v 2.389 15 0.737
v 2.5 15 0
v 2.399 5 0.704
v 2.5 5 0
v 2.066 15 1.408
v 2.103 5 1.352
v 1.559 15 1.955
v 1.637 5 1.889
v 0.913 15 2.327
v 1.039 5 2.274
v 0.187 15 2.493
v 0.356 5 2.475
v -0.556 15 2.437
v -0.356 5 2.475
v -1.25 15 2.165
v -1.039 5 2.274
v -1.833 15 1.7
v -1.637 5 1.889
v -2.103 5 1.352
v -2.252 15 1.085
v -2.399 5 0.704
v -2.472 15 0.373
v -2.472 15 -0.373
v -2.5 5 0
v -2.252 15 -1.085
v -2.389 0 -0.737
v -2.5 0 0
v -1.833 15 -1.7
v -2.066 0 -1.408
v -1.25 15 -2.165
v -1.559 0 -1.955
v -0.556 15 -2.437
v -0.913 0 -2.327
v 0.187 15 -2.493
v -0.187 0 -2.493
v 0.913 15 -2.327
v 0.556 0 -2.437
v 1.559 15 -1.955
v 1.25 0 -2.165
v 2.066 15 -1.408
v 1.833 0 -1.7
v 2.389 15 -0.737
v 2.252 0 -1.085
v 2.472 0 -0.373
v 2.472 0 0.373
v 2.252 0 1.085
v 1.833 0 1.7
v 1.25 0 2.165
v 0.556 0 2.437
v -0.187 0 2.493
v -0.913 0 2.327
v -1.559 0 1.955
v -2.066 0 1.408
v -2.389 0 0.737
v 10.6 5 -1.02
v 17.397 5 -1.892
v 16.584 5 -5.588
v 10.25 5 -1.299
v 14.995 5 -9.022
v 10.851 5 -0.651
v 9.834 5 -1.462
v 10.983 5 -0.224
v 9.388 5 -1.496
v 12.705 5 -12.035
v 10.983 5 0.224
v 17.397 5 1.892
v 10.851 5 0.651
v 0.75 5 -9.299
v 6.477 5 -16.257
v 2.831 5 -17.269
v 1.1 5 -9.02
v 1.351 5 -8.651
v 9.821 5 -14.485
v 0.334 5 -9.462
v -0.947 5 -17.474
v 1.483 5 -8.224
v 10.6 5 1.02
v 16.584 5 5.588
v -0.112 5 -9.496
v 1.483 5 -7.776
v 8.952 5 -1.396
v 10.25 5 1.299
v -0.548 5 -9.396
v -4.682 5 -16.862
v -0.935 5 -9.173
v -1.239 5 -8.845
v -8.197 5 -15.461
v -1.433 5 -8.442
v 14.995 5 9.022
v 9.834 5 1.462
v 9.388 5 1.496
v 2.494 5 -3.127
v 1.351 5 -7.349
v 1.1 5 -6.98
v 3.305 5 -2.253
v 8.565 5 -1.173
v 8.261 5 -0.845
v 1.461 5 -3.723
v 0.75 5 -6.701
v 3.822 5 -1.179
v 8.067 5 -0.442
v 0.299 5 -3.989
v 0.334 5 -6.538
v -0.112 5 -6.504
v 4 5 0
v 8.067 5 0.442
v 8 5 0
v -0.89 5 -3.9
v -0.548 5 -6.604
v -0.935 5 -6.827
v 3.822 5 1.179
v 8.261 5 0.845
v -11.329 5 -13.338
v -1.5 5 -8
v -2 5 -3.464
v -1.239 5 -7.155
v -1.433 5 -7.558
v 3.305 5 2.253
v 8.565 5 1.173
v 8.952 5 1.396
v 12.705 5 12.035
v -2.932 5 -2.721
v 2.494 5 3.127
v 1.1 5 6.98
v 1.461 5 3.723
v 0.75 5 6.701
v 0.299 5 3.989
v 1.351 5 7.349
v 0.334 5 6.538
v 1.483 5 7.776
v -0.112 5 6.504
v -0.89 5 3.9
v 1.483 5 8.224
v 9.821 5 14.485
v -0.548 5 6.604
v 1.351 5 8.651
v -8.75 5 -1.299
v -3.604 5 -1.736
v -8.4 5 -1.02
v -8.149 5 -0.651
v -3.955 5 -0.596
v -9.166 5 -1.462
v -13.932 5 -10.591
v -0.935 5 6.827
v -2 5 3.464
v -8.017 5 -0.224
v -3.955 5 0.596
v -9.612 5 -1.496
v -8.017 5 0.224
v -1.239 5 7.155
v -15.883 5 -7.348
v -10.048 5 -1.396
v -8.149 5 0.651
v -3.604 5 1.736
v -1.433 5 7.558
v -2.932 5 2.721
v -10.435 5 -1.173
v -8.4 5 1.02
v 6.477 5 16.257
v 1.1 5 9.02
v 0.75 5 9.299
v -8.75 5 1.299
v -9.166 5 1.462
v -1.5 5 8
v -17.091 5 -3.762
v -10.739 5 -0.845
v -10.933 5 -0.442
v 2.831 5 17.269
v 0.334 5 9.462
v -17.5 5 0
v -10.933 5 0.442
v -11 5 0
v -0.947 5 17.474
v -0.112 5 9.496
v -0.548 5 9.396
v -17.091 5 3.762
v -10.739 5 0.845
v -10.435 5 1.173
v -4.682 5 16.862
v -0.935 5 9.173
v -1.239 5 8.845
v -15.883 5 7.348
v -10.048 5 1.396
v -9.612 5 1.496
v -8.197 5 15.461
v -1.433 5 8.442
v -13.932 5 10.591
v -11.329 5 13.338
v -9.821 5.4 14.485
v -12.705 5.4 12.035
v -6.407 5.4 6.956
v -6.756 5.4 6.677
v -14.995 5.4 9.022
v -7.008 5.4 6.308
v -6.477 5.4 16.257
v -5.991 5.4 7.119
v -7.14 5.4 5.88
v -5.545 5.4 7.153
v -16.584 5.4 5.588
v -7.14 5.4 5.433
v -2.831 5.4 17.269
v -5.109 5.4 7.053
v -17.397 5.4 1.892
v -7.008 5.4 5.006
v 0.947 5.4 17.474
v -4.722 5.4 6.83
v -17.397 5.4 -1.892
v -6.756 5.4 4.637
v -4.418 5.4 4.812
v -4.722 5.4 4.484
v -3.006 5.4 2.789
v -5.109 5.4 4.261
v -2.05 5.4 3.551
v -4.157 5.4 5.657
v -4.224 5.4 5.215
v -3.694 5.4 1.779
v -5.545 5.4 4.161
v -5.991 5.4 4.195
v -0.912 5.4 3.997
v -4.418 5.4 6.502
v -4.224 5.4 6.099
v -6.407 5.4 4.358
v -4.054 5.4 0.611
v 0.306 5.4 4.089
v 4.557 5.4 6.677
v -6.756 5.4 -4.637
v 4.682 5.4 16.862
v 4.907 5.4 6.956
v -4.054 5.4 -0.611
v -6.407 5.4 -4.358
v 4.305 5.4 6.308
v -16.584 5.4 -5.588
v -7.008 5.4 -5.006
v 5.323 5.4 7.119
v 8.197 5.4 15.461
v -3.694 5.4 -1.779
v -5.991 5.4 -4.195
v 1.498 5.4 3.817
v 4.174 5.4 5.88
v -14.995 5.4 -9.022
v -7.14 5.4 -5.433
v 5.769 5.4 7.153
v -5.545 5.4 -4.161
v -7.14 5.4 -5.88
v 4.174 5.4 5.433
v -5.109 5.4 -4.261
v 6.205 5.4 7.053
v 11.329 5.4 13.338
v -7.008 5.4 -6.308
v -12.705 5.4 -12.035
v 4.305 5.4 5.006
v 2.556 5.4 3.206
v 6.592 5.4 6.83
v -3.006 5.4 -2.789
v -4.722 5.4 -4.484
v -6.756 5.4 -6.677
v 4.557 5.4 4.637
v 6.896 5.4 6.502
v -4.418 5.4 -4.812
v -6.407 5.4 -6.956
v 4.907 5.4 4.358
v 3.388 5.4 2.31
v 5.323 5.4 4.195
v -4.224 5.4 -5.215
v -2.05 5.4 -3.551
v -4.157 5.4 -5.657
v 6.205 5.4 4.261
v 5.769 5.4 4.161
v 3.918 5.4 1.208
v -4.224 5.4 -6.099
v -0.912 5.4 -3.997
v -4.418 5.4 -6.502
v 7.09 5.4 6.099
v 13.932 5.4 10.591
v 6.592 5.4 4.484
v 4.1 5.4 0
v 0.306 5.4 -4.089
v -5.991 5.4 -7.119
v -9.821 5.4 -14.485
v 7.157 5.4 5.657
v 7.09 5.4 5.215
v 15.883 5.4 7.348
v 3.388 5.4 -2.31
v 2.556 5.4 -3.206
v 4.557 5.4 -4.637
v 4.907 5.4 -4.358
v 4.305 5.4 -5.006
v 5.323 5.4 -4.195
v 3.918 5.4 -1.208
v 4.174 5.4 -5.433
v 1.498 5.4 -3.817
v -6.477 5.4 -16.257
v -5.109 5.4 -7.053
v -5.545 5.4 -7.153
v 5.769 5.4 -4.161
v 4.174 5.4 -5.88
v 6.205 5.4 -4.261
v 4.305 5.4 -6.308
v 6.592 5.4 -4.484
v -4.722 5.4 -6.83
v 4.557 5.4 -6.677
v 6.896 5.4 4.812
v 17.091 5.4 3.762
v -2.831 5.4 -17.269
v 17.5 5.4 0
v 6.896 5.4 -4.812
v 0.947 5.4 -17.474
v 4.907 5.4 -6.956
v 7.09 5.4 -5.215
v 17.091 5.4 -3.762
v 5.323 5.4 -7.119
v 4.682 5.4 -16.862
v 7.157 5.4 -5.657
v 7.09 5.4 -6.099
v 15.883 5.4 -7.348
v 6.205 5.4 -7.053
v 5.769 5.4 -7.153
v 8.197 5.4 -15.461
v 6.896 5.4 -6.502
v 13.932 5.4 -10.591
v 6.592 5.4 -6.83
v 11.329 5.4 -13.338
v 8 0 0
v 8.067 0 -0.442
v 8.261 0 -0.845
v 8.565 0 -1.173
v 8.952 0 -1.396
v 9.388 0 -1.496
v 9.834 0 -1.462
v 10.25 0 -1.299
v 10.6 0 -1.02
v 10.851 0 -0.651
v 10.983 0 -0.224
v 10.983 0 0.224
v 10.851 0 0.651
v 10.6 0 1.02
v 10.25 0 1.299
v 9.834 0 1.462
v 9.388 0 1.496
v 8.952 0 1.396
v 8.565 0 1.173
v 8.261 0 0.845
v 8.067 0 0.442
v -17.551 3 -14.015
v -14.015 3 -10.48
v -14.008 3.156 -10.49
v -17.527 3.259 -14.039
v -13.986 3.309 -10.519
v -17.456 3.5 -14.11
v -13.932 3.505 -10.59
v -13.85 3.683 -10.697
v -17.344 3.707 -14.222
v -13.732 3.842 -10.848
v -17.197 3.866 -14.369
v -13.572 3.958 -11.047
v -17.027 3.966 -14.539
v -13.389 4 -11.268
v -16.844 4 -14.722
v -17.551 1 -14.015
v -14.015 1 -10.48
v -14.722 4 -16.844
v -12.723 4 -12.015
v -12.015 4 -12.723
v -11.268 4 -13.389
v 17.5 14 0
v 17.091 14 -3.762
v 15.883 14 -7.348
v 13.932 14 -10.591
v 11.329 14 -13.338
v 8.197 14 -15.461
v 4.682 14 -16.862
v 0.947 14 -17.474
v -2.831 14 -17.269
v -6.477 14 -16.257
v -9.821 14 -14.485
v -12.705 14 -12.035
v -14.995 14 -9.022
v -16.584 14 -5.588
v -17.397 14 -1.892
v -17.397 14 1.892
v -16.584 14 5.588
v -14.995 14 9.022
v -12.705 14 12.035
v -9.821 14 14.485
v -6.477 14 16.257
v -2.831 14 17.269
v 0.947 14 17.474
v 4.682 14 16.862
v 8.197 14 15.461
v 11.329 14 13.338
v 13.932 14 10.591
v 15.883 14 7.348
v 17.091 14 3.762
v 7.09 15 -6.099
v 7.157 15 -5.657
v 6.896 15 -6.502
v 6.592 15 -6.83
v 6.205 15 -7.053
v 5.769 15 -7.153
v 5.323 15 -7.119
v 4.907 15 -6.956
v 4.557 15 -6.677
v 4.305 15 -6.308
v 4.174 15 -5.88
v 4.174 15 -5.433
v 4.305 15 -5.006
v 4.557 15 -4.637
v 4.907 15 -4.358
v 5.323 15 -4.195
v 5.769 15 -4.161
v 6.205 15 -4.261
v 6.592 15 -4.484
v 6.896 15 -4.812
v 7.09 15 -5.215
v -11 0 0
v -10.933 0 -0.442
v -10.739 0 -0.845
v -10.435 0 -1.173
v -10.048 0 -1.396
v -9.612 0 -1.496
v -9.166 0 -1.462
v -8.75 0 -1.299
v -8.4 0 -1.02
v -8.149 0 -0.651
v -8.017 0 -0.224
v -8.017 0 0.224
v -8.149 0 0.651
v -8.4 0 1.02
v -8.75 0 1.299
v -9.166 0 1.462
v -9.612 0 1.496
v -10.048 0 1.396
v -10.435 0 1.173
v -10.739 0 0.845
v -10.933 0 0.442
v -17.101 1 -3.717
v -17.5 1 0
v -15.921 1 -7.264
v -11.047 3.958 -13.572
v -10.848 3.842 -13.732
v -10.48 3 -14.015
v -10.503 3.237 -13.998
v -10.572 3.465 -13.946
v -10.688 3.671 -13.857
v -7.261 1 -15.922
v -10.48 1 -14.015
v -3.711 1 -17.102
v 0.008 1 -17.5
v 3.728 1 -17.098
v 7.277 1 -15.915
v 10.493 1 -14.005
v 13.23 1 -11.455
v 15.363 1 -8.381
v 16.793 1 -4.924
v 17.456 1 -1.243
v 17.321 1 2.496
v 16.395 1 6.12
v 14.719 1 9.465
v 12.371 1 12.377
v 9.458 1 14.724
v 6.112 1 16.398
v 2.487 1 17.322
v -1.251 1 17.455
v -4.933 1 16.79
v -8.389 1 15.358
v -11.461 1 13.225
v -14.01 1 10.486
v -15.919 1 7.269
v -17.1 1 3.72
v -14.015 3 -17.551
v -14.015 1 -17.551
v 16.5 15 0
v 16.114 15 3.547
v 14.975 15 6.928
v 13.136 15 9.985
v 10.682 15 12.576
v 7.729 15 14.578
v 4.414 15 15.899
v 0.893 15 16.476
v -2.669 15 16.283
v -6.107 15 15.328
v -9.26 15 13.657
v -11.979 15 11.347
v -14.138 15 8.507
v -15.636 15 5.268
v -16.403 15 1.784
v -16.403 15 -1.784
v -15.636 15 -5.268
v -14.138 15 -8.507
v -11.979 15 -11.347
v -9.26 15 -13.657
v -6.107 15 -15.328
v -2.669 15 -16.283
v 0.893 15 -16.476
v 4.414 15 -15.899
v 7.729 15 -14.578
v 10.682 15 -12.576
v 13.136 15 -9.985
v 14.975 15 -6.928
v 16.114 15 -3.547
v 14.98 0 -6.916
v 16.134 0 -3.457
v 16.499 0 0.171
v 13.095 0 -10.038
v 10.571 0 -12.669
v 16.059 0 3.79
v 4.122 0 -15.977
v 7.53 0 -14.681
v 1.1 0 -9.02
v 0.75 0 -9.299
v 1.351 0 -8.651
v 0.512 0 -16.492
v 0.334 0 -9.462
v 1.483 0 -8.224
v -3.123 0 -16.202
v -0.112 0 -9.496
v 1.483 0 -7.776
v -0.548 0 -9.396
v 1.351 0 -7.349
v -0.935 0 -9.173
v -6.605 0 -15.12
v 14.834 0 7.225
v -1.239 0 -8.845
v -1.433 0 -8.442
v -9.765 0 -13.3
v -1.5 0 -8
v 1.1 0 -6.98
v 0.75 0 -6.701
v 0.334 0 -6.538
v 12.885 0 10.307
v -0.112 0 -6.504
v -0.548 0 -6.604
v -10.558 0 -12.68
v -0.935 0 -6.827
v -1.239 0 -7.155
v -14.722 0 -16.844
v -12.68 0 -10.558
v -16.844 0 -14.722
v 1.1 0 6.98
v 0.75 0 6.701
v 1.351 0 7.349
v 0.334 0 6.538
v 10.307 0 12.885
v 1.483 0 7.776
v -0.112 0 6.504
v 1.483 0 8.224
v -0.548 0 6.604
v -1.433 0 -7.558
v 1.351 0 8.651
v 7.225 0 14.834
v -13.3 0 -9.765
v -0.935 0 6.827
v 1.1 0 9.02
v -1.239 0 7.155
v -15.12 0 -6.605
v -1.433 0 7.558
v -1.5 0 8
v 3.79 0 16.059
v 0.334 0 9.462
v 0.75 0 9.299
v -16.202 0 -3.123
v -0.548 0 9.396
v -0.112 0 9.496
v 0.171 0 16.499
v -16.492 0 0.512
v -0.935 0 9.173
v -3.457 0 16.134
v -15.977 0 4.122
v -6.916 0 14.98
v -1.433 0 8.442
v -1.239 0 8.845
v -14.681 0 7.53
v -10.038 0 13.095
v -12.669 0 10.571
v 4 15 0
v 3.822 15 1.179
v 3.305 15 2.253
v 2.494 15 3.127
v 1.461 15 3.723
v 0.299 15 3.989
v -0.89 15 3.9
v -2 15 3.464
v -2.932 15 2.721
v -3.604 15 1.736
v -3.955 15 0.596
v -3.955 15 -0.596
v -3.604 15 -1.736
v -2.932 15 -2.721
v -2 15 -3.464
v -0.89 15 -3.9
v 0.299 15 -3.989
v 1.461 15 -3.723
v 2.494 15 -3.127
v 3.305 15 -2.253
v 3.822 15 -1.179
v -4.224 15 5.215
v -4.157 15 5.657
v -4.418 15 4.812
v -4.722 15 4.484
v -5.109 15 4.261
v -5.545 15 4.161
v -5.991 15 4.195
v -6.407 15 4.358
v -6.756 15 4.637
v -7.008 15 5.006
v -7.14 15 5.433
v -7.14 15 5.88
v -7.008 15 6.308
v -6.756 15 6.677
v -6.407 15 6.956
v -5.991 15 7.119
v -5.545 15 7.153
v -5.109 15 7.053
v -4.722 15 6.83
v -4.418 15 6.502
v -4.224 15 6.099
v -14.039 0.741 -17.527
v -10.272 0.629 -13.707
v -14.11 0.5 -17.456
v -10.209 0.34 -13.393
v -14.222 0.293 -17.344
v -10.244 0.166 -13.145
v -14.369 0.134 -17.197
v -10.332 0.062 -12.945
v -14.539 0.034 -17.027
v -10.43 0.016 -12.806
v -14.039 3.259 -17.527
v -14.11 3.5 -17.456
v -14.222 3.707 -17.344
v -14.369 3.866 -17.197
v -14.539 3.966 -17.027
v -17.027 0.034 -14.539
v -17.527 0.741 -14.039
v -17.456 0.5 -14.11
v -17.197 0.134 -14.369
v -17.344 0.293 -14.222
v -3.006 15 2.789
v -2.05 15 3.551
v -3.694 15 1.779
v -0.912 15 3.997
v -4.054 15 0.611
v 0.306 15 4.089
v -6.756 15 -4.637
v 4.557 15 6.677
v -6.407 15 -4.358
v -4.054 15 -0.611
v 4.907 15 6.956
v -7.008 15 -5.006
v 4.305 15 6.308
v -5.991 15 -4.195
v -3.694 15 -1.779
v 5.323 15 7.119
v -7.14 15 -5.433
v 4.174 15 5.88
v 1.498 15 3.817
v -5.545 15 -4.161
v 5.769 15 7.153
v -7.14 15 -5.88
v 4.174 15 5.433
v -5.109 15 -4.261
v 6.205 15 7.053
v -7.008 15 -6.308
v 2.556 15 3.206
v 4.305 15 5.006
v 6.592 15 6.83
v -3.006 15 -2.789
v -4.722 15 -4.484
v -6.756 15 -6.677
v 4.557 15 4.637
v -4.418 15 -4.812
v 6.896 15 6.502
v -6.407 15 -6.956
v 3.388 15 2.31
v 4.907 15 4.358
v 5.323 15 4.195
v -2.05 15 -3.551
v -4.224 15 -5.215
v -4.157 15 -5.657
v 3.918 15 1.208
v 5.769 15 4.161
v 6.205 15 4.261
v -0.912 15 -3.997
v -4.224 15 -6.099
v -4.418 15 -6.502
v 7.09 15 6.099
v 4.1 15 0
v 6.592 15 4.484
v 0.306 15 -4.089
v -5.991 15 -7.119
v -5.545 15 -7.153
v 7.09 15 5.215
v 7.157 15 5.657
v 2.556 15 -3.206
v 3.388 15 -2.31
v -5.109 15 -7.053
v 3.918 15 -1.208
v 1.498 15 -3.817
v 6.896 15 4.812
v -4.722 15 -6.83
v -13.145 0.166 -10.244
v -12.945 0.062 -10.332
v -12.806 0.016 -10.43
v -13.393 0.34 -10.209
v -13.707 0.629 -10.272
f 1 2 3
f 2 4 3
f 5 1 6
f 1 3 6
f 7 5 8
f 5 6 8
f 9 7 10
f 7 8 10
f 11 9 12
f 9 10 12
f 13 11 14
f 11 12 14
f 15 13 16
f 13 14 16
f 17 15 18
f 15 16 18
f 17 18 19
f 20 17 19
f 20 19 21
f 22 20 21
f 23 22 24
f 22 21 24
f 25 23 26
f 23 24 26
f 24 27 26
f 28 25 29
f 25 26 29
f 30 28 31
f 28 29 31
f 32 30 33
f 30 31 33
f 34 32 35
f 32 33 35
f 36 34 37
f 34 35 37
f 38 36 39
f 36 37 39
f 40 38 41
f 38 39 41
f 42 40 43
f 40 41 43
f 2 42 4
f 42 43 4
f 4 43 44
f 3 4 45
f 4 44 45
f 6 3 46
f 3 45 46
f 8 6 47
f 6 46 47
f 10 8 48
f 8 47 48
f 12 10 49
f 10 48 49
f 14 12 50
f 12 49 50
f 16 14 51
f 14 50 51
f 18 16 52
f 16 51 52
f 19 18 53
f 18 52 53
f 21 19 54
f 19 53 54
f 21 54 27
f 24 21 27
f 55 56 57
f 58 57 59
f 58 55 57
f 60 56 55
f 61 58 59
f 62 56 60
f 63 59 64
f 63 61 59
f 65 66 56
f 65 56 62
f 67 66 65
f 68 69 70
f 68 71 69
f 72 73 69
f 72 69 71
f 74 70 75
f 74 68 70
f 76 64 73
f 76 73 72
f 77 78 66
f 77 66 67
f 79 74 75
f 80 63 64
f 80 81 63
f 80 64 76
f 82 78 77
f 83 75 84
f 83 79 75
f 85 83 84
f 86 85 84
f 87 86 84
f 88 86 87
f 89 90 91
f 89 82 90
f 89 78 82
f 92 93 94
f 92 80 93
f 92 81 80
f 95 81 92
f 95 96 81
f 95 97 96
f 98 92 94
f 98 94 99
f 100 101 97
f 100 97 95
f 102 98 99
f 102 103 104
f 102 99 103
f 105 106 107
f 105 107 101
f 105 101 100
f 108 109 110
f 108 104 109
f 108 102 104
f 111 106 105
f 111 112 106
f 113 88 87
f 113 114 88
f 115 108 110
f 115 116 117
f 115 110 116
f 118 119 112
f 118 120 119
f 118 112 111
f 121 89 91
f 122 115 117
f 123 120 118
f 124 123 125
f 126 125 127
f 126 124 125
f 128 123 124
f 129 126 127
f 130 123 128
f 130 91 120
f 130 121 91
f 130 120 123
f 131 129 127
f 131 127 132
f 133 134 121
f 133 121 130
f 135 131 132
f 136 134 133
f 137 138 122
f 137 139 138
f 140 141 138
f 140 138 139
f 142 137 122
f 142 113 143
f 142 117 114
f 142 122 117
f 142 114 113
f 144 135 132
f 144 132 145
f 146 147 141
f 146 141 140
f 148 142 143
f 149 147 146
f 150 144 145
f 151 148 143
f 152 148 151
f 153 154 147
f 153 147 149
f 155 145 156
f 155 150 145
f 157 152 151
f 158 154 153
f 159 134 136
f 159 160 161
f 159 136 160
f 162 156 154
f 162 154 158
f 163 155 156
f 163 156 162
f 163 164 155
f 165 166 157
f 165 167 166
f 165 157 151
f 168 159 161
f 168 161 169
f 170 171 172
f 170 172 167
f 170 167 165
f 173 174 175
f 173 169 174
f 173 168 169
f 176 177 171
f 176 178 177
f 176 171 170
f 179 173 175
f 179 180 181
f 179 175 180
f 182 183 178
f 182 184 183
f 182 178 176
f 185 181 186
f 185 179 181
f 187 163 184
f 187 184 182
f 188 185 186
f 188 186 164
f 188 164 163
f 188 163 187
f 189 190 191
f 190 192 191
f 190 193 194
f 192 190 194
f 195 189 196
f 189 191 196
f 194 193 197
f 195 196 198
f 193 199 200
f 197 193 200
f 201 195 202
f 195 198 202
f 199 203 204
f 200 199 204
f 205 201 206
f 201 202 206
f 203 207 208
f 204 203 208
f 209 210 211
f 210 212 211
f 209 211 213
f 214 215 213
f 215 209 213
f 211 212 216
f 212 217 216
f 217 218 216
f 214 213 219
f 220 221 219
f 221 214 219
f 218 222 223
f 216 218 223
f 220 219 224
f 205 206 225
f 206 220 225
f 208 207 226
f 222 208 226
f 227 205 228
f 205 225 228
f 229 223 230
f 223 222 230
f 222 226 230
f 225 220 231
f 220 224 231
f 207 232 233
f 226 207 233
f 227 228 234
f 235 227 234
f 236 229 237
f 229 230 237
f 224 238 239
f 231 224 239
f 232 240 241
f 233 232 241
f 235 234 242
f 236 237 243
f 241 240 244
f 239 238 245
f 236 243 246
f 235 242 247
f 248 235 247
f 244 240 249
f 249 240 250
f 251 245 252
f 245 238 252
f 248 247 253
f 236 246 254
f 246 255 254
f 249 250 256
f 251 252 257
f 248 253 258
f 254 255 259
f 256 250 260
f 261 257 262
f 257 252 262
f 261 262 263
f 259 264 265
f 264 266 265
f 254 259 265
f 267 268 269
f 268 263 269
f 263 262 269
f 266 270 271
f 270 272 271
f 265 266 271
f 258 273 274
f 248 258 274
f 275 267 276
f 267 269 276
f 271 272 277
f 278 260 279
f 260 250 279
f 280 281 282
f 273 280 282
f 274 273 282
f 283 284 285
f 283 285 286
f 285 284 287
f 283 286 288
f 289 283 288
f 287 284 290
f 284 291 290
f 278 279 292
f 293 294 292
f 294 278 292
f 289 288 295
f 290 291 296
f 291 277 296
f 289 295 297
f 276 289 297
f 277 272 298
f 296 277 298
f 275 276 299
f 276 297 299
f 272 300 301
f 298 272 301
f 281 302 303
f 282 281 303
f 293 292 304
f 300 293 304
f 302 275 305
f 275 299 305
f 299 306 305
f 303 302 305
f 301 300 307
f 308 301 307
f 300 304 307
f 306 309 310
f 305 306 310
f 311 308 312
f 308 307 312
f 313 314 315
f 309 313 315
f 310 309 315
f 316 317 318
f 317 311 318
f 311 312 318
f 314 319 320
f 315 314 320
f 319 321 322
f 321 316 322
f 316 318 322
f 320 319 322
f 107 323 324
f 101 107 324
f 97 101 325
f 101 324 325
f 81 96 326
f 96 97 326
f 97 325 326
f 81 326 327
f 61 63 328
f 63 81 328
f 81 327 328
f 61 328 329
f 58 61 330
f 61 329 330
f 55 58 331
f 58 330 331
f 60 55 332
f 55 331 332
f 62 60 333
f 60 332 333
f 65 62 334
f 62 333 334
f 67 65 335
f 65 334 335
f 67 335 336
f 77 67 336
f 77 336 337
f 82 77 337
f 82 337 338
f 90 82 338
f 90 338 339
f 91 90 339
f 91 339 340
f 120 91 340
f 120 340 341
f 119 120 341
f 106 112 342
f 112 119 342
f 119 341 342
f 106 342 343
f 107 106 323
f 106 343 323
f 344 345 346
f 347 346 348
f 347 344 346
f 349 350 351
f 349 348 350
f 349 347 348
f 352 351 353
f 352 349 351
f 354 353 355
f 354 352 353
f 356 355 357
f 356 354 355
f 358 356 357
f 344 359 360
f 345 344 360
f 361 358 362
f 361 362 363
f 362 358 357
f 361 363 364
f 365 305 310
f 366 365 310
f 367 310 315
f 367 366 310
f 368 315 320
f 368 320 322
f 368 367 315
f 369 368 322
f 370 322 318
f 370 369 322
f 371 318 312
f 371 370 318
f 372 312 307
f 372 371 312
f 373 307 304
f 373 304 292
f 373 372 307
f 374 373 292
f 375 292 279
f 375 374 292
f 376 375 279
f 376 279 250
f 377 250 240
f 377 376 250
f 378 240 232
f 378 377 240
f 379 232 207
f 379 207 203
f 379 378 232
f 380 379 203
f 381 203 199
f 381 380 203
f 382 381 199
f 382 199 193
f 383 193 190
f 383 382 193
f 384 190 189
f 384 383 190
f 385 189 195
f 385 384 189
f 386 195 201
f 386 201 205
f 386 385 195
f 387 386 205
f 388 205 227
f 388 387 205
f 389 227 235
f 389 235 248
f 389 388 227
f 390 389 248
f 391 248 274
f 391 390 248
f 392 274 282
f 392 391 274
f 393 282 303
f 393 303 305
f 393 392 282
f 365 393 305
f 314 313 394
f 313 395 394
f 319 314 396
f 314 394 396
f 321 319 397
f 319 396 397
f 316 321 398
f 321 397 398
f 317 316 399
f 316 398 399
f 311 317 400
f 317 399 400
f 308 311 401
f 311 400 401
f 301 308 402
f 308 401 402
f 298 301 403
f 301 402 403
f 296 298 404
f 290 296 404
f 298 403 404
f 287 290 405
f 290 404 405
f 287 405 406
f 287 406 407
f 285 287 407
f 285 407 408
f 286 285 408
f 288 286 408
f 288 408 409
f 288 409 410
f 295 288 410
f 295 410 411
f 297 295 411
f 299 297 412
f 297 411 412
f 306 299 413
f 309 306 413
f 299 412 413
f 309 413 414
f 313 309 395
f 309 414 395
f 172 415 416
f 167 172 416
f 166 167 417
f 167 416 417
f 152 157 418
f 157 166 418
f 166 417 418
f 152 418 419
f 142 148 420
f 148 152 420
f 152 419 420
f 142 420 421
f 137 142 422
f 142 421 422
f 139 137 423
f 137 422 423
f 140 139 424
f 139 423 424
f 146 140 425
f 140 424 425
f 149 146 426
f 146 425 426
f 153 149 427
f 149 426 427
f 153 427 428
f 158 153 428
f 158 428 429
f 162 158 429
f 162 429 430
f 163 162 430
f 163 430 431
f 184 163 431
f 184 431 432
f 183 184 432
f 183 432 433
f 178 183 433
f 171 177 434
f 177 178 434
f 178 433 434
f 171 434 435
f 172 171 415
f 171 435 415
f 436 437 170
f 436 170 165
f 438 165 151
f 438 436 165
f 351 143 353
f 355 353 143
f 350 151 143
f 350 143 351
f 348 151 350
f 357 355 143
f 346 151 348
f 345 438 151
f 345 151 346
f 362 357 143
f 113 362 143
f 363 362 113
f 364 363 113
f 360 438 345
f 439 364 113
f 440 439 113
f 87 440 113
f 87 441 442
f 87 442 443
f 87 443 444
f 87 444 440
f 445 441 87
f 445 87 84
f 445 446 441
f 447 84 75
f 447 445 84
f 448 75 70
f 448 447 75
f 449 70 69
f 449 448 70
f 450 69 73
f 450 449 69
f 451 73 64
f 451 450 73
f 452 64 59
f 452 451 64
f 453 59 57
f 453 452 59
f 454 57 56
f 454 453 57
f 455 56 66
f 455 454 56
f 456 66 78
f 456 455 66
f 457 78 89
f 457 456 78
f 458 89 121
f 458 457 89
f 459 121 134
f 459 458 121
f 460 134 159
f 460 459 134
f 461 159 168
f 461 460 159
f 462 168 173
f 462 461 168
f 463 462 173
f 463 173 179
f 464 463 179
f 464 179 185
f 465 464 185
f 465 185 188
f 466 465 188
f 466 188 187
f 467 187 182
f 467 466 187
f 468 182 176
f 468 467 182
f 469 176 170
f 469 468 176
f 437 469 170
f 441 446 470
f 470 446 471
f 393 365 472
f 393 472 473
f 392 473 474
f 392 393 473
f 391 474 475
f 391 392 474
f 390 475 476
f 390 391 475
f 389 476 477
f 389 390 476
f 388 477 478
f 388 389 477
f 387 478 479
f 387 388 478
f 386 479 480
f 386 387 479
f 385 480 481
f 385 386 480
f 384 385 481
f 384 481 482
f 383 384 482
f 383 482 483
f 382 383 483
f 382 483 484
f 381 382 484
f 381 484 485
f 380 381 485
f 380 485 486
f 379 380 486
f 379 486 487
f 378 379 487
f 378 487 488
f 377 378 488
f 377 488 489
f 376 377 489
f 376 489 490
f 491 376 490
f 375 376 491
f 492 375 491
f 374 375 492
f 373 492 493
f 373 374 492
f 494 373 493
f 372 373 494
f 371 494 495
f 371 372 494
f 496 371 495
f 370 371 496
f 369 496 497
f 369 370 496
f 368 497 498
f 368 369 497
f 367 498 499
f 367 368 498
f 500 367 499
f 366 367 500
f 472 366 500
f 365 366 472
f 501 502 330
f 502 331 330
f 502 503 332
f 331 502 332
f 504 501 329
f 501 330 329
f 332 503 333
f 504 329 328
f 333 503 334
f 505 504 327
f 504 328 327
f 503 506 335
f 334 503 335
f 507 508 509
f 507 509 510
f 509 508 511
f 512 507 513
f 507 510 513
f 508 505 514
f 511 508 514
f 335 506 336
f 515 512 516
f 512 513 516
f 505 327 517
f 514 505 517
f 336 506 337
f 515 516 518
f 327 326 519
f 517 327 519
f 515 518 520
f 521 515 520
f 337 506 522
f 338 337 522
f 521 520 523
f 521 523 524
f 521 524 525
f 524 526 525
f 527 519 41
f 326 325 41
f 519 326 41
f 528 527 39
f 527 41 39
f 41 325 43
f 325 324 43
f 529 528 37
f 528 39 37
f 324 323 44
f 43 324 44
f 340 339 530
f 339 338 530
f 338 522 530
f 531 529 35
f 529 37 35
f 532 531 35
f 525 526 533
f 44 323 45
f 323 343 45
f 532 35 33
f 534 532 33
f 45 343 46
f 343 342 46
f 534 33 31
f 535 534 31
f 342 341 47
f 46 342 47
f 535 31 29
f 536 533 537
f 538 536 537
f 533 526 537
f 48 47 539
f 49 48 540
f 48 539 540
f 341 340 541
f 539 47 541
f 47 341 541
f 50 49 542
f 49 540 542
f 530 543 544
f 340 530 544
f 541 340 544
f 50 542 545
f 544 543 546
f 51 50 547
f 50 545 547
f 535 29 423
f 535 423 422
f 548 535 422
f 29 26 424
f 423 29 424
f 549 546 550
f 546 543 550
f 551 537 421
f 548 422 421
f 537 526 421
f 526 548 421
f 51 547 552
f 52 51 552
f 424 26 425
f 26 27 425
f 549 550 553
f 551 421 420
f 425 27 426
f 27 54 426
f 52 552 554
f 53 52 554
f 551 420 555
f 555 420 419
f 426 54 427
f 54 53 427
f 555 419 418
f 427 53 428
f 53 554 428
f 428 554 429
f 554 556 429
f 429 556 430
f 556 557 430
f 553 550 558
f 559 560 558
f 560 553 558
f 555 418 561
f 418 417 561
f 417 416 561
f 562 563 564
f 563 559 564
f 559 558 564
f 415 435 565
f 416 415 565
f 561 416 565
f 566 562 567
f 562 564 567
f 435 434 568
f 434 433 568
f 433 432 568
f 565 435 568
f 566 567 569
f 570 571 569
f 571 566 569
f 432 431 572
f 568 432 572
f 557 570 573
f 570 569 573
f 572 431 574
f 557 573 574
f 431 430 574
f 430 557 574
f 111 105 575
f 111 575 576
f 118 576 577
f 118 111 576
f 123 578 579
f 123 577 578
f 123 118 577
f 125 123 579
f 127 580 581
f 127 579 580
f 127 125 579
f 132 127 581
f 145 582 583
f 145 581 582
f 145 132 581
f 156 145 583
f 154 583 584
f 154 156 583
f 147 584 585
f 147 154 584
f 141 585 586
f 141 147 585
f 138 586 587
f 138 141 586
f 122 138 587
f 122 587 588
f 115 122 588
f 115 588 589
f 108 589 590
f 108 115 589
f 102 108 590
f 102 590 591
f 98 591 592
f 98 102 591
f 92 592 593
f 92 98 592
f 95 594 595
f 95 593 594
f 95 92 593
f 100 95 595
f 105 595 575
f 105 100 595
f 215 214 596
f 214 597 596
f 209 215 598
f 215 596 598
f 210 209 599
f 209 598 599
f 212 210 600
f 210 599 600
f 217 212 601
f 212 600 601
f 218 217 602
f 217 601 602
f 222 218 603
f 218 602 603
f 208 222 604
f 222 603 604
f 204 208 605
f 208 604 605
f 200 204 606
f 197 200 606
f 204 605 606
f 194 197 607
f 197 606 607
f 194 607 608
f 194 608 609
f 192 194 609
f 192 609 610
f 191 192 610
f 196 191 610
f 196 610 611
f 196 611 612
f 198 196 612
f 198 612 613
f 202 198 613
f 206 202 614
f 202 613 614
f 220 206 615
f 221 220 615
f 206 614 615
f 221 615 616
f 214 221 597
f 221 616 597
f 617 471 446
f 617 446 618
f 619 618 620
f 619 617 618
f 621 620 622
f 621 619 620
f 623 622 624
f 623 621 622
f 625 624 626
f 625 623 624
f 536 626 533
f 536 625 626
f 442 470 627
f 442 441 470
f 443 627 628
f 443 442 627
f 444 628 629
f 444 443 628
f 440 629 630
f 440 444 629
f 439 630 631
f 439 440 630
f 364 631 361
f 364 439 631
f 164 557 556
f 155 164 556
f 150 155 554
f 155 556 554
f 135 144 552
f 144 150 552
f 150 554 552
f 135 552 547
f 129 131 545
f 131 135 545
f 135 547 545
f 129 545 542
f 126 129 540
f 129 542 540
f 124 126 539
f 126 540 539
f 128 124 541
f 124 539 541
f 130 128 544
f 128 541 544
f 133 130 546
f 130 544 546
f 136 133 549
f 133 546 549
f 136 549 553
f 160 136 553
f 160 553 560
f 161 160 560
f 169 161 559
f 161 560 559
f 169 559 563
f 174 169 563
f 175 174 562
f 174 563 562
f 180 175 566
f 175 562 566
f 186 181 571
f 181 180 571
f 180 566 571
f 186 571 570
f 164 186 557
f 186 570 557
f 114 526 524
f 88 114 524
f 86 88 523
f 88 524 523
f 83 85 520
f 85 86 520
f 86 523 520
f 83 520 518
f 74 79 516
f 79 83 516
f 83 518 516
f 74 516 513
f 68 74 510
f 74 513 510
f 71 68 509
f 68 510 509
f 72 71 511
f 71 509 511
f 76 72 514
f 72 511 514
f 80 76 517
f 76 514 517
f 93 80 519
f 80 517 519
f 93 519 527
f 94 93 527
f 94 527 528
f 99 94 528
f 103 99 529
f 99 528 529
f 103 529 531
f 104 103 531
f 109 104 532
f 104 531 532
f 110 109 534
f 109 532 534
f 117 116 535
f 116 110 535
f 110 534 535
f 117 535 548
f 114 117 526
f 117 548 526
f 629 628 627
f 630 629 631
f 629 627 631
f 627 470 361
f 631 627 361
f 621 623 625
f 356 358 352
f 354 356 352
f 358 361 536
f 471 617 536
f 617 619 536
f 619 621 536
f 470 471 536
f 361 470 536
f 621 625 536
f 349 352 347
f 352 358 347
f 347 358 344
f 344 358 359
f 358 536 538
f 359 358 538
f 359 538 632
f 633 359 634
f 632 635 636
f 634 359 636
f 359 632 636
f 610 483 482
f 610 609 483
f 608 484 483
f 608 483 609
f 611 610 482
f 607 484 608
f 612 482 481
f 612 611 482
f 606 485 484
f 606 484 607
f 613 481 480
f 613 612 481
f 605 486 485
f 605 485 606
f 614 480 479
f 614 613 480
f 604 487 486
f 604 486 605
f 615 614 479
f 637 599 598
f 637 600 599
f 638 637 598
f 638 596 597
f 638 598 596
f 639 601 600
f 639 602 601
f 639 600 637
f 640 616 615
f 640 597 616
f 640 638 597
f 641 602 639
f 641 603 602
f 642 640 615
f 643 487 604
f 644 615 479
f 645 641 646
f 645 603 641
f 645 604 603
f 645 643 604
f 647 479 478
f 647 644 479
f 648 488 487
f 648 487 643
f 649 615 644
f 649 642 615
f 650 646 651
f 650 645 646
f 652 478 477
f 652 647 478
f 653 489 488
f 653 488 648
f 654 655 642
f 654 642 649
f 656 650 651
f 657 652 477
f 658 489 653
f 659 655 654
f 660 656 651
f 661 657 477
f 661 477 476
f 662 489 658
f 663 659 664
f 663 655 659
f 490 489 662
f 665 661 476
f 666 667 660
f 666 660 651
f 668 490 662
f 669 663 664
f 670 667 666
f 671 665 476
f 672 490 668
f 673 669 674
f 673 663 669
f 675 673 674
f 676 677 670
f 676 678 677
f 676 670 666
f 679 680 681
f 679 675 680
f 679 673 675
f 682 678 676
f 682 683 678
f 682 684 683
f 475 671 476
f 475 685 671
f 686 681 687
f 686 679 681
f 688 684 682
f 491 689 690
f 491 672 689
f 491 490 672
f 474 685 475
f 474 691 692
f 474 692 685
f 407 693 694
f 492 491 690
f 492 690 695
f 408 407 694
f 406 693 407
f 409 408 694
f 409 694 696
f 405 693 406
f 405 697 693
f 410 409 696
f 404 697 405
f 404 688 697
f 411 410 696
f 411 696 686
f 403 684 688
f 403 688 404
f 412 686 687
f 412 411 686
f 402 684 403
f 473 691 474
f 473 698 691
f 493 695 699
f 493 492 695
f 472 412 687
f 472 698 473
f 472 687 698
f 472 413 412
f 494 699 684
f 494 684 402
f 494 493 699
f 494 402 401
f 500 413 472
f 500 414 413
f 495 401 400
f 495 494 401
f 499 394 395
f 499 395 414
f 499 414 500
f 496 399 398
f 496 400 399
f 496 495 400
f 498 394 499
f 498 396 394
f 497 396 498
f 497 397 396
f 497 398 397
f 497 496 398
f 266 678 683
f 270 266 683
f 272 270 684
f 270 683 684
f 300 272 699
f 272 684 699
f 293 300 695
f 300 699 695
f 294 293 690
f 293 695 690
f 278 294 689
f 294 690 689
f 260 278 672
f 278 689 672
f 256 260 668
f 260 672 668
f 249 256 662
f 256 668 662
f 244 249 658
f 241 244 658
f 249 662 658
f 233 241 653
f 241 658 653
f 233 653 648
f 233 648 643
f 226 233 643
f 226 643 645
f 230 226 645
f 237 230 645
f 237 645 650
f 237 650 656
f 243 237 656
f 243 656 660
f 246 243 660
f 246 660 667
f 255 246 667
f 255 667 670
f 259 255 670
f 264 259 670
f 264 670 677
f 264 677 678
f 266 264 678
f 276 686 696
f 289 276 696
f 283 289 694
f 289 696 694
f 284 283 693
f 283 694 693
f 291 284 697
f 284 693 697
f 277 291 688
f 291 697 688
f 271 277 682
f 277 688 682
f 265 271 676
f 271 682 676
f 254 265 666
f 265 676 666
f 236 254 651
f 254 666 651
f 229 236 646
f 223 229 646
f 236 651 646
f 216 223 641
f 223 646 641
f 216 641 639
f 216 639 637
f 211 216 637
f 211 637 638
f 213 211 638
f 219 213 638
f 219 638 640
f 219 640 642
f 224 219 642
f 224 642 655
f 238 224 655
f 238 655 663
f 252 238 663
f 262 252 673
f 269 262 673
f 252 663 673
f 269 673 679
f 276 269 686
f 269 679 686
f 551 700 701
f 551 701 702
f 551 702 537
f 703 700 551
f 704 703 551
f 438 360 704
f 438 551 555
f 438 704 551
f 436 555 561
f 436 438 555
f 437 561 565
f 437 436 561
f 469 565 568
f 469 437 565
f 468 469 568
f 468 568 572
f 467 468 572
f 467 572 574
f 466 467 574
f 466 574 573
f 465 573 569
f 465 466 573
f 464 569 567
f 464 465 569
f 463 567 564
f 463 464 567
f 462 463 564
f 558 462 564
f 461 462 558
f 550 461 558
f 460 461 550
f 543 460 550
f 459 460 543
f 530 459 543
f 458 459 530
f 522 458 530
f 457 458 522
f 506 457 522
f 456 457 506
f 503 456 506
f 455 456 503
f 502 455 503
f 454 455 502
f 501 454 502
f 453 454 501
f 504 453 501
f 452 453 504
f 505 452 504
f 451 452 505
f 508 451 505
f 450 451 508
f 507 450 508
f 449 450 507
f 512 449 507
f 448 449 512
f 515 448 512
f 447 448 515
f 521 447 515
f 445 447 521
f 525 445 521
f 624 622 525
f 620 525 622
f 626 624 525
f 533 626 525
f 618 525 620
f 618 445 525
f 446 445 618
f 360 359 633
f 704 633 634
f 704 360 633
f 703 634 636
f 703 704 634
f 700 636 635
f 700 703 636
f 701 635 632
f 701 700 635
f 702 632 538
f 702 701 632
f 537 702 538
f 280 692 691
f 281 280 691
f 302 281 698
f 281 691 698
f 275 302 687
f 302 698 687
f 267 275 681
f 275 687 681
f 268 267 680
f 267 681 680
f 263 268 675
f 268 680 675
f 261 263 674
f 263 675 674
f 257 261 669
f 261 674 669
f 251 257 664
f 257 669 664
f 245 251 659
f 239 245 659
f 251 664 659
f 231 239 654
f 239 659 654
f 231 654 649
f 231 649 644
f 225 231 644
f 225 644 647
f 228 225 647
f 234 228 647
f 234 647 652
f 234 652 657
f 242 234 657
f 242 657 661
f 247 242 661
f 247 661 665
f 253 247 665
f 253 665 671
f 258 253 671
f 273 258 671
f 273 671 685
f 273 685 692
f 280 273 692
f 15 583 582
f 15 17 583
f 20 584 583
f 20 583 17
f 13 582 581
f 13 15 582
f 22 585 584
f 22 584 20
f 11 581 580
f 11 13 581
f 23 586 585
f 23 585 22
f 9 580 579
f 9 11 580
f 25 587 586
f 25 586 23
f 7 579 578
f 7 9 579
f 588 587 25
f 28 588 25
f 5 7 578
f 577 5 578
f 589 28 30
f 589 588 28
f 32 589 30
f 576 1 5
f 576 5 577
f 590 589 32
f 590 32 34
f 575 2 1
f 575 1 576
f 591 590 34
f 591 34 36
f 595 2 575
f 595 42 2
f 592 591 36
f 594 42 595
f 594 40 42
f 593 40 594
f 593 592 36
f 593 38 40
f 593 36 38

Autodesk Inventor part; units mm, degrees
ref_plane "YZ Plane" through (0, 0, 0) normal (1, 0, 0) x (0, 1, 0)
ref_plane "XZ Plane" through (0, 0, 0) normal (0, 1, 0) x (-1, 0, 0)
ref_plane "XY Plane" through (0, 0, 0) normal (0, 0, 1) x (1, 0, 0)
sketch "Sketch1" plane through (0, 0, 0) normal (0, 1, 0) x (-1, 0, 0)
  circle A0 centre (0, 0) radius 17.5
  circle A1 centre (0, 0) radius 2.5
  circle A2 centre (9.5, 0) radius 1.5
  circle A3 centre (0, -8) radius 1.5
  circle A4 centre (-9.5, 0) radius 1.5
  circle A5 centre (0, 8) radius 1.5
  dimension "d0" = 35
  dimension "d1" = 5
  dimension "d2" = 3
  dimension "d3" = 16
  dimension "d4" = 8
  dimension "d5" = 19
  dimension "d6" = 9.5
extrude "Extrusion1" add sketch "Sketch1" along normal blind 5
sketch "Sketch2" plane through (0, 5, 0) normal (0, 1, 0) x (1, 0, 0)
  circle A0 centre (0, 0) radius 4
  circle A1 centre (0, 0) radius 2.5
  dimension "d9" = 8
  dimension "d10" = 5
extrude "Extrusion2" add sketch "Sketch2" along normal blind 10
chamfer "Chamfer1" distance 1 angle 45 1 edges at (17.5, 0, 0)
sketch "Sketch3" plane through (0, 15, 0) normal (0, 1, 0) x (1, 0, 0)
  circle A0 centre (0, 0) radius 17.5
  circle A1 centre (0, 0) radius 4.1
  circle A2 centre (0, 0) radius 2.5 construction
  circle A3 centre (0, 0) radius 8 construction
  circle A4 centre (-5.6569, -5.6569) radius 1.5
  circle A5 centre (-5.6569, 5.6569) radius 1.5
  circle A6 centre (5.6569, 5.6569) radius 1.5
  circle A7 centre (5.6569, -5.6569) radius 1.5
  dimension "d16" = 35
  dimension "d17" = 8.2
  dimension "d18" = 16
  dimension "d19" = 3
  dimension "d20" = 90
extrude "Extrusion3" add sketch "Sketch3" against normal blind 9.6
chamfer "Chamfer2" distance 1 angle 45 1 edges at (-17.5, 15, 0)
sketch "Sketch4" plane through (0, 0, 0) normal (0, -1, 0) x (1, 0, 0)
  line L0 (-10.4797, -6.9441) -> (-6.9441, -10.4797)
  line L1 (-10.4797, -6.9441) -> (-5.4797, -6.9441) construction
  line L2 (-6.9441, -10.4797) -> (-14.0152, -17.5507)
  line L3 (-14.0152, -17.5507) -> (-17.5507, -14.0152)
  line L4 (-17.5507, -14.0152) -> (-10.4797, -6.9441)
  line L5 (-15.783, -15.783) -> (0, 0) construction
  circle A0 centre (0, 0) radius 17.5 projected
  point P0 (-14.0152, -10.4797)
  dimension "d26" = 45
  dimension "d27" = 5
  dimension "d28" = 10
extrude "Extrusion4" add sketch "Sketch4" against normal blind 4 contours L0 L2 A0 L4 | A0 L2 L3 L4 picked at (-10.125, -9.731)
fillet "Fillet1" radius 1 4 edges at (-15.4255, 0, -11.89) (-15.783, 4, -12.2474) (-11.89, 0, -15.4255) (-12.2474, 4, -15.783)
properties part number "Motor"
